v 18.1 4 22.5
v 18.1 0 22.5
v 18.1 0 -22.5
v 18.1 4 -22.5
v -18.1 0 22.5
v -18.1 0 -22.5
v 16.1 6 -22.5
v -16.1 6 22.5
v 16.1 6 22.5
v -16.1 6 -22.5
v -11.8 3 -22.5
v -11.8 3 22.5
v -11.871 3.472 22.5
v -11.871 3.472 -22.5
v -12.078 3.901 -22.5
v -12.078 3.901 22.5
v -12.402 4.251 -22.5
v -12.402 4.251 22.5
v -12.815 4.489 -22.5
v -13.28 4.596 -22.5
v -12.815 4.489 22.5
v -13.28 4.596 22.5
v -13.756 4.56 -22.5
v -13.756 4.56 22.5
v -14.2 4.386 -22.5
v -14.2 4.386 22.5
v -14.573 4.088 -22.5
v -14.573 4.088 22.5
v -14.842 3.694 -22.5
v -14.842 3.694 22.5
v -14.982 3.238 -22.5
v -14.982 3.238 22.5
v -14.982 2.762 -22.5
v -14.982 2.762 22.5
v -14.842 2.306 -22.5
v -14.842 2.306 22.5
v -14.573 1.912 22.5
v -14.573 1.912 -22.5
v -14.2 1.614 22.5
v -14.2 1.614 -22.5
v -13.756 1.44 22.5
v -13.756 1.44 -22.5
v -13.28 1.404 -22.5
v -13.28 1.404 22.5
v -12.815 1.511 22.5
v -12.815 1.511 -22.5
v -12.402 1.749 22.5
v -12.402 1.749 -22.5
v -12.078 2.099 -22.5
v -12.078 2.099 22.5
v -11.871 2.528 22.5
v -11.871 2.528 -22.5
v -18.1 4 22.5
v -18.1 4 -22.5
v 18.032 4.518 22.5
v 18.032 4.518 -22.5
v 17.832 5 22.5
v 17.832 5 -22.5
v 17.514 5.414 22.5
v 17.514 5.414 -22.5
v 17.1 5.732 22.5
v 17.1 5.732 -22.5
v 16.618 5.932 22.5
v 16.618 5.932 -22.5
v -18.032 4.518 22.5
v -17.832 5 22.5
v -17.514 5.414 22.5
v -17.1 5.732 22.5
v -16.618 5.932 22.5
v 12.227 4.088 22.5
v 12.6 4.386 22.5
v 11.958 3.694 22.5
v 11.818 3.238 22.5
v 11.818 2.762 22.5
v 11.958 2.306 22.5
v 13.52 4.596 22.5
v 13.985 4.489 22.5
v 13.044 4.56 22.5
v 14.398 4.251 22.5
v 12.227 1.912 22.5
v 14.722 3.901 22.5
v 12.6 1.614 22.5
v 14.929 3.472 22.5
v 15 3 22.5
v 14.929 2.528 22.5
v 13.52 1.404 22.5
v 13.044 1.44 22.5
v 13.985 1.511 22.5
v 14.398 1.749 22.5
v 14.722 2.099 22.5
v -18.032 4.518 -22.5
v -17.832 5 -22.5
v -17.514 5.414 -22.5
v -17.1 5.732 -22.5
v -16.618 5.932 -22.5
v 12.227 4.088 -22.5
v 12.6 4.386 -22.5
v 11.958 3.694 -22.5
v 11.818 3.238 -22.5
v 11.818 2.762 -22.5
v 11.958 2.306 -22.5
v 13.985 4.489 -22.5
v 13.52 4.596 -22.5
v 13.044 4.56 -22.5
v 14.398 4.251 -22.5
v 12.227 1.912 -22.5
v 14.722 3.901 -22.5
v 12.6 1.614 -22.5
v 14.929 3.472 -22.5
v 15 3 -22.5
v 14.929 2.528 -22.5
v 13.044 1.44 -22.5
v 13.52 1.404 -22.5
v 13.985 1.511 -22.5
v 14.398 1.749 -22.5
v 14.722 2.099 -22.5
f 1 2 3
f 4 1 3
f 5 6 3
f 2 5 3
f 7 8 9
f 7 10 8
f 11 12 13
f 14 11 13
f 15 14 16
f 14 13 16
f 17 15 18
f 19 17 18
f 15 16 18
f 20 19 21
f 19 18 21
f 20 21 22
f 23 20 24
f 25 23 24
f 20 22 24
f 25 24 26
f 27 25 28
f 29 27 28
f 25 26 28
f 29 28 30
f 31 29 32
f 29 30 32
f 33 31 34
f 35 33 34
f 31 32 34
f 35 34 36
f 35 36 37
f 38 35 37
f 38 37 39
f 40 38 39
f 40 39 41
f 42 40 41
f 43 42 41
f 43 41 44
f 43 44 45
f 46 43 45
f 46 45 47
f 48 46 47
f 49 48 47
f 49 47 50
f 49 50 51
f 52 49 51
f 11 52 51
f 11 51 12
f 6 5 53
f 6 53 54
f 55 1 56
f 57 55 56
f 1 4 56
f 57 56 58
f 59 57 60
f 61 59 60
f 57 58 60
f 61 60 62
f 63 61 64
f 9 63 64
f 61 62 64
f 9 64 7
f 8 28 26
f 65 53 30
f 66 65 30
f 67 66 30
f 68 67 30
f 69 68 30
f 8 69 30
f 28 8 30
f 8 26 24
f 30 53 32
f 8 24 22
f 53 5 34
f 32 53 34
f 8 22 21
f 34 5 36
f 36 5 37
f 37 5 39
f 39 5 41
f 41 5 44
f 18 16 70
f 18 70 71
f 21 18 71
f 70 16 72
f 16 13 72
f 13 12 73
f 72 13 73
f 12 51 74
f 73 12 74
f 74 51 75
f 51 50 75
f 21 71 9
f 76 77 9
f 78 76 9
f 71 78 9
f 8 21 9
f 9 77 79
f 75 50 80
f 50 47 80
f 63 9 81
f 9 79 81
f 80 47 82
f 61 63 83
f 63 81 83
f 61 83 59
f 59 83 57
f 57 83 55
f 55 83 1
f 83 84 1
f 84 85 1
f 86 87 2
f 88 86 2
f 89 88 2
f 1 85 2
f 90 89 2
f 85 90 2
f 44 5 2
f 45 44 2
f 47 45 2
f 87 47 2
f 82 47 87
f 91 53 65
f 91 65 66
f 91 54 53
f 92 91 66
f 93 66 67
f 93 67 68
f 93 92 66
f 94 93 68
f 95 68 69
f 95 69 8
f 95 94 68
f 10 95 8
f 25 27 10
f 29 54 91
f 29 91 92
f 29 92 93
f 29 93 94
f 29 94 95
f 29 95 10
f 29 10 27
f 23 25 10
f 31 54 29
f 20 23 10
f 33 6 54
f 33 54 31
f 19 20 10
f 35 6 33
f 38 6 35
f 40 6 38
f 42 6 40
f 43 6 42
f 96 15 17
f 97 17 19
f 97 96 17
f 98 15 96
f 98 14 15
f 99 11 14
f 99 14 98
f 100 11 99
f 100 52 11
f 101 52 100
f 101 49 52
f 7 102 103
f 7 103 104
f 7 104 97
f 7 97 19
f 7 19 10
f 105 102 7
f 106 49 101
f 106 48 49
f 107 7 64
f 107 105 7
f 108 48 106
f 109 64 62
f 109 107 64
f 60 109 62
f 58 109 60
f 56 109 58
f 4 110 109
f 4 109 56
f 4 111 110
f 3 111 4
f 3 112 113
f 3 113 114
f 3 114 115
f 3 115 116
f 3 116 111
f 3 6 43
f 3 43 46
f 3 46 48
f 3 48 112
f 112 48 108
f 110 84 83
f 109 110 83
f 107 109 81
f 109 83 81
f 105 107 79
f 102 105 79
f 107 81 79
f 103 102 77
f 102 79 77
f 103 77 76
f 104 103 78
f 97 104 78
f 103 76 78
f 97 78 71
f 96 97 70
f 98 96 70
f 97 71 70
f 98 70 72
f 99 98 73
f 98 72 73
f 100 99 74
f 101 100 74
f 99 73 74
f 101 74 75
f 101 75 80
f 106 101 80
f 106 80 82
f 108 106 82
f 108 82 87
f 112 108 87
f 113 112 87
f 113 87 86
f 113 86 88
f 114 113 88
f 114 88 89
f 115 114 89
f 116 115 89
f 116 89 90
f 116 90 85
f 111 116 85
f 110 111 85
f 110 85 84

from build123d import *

# Parameters (mm, degrees)
SKETCH1_W           = 36.2
SKETCH1_H           = 45
BOSS_EXTRUDE1_DEPTH = 6
FILLET1_R           = 2
SKETCH3_R           = 1.6
CUT_EXTRUDE1_DEPTH  = 49.873407902


with BuildPart() as part:
    # Sketch1 → Boss-Extrude1 (new body)
    with BuildSketch(Plane(origin=(0, 0, 0), x_dir=(1, 0, 0), z_dir=(0, 1, 0))):
        Rectangle(SKETCH1_W, SKETCH1_H)
    extrude(amount=BOSS_EXTRUDE1_DEPTH)

    # Fillet1
    fillet1_edges = [part.edges().sort_by_distance(p)[0] for p in [
        (-18.1, 6, 0),
        (18.1, 6, 0),
    ]]
    fillet(fillet1_edges, radius=FILLET1_R)

    # Sketch3 → Cut-Extrude1 (cut, through all)
    with BuildSketch(Plane.XY.offset(22.5)):
        with Locations((-13.4, 3)):
            Circle(SKETCH3_R)
        with Locations((13.4, 3)):
            Circle(SKETCH3_R)
    extrude(amount=-CUT_EXTRUDE1_DEPTH, mode=Mode.SUBTRACT)


solid = part.part
